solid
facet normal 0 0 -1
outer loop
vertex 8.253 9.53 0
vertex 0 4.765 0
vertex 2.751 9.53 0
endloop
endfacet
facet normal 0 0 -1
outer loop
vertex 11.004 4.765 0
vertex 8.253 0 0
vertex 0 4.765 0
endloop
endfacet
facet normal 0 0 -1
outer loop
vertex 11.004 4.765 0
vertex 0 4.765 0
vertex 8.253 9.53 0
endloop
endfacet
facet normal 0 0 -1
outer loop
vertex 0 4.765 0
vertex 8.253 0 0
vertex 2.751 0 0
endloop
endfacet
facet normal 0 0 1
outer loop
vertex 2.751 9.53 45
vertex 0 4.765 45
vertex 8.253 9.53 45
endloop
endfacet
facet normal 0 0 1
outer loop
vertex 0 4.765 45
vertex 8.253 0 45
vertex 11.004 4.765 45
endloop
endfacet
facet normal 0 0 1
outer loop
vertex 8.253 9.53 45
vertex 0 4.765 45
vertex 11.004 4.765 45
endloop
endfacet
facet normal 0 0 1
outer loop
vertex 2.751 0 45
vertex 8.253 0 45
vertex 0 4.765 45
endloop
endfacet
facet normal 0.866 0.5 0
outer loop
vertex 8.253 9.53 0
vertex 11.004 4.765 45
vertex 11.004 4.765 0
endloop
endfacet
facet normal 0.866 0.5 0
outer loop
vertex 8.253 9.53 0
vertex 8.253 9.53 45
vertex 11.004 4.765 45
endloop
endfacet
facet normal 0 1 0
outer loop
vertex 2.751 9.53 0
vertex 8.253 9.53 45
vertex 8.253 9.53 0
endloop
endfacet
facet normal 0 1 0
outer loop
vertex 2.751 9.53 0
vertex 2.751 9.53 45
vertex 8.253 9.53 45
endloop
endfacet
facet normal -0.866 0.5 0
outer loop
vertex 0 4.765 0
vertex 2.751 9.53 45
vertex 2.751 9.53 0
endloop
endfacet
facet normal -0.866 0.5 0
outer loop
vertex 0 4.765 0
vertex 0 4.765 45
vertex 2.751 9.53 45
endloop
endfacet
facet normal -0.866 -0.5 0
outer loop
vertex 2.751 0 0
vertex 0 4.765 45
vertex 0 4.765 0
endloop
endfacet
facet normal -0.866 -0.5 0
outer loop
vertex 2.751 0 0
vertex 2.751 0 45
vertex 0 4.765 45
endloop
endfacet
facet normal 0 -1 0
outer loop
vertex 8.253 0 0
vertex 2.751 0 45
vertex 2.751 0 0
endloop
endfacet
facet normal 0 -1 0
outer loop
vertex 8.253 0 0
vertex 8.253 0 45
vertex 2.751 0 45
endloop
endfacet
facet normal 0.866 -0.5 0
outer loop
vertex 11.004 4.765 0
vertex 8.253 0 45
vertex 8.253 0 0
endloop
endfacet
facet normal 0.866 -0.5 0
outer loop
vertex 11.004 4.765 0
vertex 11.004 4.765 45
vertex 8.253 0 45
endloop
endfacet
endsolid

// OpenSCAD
$fn = 32;

// ----------------------------------------------------------------------
// Key bar: hex key, 45 mm thick
// ----------------------------------------------------------------------

// --- parameters (mm) ---
profile_height = 45;      // extrusion height
profile_points = 6;       // points of the closed outline

profile = [[11.004, 4.765], [8.253, 9.53], [2.751, 9.53], [0, 4.765], [2.751, 0], [8.253, 0]];  // single closed polygon, 6 points, counter clockwise

// --- the one profile operation ---
linear_extrude(height = profile_height) polygon(points = profile);
